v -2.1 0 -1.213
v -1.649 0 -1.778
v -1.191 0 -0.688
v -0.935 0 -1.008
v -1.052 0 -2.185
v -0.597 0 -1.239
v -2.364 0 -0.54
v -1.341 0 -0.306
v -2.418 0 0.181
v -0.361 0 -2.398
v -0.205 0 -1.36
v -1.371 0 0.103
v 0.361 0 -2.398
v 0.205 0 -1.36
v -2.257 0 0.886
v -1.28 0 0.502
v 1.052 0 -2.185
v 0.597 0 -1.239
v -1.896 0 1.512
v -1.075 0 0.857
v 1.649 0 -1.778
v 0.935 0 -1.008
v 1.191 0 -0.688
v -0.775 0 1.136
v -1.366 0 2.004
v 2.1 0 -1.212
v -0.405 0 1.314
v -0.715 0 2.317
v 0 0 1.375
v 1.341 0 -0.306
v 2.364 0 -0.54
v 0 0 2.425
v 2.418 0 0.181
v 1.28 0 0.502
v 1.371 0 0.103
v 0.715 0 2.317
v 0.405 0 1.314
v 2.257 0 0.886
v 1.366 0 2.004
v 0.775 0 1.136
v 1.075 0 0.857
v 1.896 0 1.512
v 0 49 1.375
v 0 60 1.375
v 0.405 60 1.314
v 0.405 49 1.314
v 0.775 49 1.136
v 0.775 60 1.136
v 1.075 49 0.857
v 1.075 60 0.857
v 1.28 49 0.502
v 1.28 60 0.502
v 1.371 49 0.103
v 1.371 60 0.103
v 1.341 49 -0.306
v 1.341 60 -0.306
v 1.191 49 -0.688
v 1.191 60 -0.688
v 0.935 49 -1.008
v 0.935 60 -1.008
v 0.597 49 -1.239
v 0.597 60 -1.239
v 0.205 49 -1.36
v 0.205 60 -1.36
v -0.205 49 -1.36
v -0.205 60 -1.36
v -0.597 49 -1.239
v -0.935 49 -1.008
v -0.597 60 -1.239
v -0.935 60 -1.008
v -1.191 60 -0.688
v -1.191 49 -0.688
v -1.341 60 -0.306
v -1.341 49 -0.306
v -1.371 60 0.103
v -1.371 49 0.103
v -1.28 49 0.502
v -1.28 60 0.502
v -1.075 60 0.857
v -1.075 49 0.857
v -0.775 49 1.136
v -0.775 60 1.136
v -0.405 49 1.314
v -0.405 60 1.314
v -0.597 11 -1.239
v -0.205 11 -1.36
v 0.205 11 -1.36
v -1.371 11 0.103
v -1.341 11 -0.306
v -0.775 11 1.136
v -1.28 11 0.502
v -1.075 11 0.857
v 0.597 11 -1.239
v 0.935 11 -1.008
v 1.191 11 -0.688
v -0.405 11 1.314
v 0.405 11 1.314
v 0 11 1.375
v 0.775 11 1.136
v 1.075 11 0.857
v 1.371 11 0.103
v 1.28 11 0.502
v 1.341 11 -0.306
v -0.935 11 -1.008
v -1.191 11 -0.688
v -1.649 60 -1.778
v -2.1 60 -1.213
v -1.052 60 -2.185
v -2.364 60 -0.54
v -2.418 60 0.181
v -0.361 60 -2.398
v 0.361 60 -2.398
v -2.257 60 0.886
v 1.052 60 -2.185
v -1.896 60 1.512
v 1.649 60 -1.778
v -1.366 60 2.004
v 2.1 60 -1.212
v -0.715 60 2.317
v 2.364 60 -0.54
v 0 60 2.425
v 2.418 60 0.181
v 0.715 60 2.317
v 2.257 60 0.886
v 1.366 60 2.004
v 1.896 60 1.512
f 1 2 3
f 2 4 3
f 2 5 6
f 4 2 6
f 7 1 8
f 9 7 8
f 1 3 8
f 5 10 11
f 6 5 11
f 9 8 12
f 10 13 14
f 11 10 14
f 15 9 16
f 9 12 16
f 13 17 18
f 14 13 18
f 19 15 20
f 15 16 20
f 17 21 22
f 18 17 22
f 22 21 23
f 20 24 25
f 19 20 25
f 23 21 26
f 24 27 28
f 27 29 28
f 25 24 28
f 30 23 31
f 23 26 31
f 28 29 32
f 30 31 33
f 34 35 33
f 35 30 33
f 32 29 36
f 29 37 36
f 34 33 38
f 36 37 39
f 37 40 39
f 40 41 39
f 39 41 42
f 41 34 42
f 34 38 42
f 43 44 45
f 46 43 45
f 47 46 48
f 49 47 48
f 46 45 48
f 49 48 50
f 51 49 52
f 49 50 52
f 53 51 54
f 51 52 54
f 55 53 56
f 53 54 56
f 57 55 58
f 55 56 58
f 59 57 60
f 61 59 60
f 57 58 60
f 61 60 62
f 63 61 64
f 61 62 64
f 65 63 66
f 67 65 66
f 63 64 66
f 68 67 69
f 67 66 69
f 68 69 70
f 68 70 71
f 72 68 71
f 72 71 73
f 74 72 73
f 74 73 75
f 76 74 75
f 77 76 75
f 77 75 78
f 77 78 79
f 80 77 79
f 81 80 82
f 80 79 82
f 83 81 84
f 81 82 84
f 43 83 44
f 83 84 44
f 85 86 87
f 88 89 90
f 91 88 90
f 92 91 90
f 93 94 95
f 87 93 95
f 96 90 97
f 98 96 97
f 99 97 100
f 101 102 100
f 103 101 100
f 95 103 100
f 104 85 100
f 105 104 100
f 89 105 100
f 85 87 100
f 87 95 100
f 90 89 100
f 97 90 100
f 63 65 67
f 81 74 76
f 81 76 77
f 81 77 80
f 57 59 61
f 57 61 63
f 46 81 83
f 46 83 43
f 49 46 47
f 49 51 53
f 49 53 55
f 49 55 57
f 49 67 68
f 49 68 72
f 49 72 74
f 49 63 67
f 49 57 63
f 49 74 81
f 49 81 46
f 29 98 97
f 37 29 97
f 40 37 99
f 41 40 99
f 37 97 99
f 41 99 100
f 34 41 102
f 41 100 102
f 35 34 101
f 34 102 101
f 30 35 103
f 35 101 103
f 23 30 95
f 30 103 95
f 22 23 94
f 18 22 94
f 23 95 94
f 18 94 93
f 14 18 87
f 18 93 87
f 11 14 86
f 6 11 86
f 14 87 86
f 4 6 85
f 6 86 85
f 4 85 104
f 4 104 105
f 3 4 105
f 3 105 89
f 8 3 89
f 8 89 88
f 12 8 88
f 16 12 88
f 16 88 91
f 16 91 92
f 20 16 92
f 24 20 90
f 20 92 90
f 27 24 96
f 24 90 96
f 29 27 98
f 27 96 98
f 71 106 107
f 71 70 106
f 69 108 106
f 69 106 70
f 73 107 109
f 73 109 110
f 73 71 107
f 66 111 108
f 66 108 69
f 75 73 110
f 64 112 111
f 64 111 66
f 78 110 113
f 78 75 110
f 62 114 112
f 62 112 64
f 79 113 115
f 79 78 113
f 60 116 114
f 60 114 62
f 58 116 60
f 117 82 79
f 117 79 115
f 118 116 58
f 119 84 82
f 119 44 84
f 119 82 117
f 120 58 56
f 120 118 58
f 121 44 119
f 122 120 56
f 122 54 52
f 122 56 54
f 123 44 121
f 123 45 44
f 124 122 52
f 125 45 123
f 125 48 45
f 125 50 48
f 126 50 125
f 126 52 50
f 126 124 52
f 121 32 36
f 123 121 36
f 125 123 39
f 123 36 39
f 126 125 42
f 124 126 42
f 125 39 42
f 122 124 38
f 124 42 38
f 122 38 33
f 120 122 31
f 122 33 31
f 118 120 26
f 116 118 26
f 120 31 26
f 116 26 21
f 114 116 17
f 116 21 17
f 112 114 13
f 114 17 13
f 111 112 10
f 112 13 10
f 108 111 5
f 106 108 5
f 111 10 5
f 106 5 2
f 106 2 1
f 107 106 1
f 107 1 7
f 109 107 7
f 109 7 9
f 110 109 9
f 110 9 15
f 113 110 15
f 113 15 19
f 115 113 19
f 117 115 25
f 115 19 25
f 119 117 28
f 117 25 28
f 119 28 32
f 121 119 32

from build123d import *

# Parameters (mm, degrees)
SKETCH1_R           = 2.425
BOSS_EXTRUDE1_DEPTH = 60
SKETCH2_R           = 1.375
CUT_EXTRUDE1_DEPTH  = 11
CUT_EXTRUDE2_START  = -49
SKETCH2_2_R         = 1.375
CUT_EXTRUDE2_DEPTH  = 11


with BuildPart() as part:
    # Sketch1 → Boss-Extrude1 (new body)
    with BuildSketch(Plane(origin=(0, 0, 0), x_dir=(1, 0, 0), z_dir=(0, 1, 0))):
        with Locations(Location((0, 0, 0), (0, 0, 270))):
            Circle(SKETCH1_R)
    extrude(amount=BOSS_EXTRUDE1_DEPTH)

    # Sketch2 → Cut-Extrude1 (cut)
    with BuildSketch(Plane(origin=(0, 60, 0), x_dir=(1, 0, 0), z_dir=(0, 1, 0))):
        with Locations(Location((0, 0, 0), (0, 0, 270))):
            Circle(SKETCH2_R)
    extrude(amount=-CUT_EXTRUDE1_DEPTH, mode=Mode.SUBTRACT)

    # Sketch2<2> → Cut-Extrude2 (cut)
    with BuildSketch(Plane(origin=(0, 60, 0), x_dir=(1, 0, 0), z_dir=(0, 1, 0)).offset(CUT_EXTRUDE2_START)):
        with Locations(Location((0, 0, 0), (0, 0, 270))):
            Circle(SKETCH2_2_R)
    extrude(amount=-CUT_EXTRUDE2_DEPTH, mode=Mode.SUBTRACT)


solid = part.part
